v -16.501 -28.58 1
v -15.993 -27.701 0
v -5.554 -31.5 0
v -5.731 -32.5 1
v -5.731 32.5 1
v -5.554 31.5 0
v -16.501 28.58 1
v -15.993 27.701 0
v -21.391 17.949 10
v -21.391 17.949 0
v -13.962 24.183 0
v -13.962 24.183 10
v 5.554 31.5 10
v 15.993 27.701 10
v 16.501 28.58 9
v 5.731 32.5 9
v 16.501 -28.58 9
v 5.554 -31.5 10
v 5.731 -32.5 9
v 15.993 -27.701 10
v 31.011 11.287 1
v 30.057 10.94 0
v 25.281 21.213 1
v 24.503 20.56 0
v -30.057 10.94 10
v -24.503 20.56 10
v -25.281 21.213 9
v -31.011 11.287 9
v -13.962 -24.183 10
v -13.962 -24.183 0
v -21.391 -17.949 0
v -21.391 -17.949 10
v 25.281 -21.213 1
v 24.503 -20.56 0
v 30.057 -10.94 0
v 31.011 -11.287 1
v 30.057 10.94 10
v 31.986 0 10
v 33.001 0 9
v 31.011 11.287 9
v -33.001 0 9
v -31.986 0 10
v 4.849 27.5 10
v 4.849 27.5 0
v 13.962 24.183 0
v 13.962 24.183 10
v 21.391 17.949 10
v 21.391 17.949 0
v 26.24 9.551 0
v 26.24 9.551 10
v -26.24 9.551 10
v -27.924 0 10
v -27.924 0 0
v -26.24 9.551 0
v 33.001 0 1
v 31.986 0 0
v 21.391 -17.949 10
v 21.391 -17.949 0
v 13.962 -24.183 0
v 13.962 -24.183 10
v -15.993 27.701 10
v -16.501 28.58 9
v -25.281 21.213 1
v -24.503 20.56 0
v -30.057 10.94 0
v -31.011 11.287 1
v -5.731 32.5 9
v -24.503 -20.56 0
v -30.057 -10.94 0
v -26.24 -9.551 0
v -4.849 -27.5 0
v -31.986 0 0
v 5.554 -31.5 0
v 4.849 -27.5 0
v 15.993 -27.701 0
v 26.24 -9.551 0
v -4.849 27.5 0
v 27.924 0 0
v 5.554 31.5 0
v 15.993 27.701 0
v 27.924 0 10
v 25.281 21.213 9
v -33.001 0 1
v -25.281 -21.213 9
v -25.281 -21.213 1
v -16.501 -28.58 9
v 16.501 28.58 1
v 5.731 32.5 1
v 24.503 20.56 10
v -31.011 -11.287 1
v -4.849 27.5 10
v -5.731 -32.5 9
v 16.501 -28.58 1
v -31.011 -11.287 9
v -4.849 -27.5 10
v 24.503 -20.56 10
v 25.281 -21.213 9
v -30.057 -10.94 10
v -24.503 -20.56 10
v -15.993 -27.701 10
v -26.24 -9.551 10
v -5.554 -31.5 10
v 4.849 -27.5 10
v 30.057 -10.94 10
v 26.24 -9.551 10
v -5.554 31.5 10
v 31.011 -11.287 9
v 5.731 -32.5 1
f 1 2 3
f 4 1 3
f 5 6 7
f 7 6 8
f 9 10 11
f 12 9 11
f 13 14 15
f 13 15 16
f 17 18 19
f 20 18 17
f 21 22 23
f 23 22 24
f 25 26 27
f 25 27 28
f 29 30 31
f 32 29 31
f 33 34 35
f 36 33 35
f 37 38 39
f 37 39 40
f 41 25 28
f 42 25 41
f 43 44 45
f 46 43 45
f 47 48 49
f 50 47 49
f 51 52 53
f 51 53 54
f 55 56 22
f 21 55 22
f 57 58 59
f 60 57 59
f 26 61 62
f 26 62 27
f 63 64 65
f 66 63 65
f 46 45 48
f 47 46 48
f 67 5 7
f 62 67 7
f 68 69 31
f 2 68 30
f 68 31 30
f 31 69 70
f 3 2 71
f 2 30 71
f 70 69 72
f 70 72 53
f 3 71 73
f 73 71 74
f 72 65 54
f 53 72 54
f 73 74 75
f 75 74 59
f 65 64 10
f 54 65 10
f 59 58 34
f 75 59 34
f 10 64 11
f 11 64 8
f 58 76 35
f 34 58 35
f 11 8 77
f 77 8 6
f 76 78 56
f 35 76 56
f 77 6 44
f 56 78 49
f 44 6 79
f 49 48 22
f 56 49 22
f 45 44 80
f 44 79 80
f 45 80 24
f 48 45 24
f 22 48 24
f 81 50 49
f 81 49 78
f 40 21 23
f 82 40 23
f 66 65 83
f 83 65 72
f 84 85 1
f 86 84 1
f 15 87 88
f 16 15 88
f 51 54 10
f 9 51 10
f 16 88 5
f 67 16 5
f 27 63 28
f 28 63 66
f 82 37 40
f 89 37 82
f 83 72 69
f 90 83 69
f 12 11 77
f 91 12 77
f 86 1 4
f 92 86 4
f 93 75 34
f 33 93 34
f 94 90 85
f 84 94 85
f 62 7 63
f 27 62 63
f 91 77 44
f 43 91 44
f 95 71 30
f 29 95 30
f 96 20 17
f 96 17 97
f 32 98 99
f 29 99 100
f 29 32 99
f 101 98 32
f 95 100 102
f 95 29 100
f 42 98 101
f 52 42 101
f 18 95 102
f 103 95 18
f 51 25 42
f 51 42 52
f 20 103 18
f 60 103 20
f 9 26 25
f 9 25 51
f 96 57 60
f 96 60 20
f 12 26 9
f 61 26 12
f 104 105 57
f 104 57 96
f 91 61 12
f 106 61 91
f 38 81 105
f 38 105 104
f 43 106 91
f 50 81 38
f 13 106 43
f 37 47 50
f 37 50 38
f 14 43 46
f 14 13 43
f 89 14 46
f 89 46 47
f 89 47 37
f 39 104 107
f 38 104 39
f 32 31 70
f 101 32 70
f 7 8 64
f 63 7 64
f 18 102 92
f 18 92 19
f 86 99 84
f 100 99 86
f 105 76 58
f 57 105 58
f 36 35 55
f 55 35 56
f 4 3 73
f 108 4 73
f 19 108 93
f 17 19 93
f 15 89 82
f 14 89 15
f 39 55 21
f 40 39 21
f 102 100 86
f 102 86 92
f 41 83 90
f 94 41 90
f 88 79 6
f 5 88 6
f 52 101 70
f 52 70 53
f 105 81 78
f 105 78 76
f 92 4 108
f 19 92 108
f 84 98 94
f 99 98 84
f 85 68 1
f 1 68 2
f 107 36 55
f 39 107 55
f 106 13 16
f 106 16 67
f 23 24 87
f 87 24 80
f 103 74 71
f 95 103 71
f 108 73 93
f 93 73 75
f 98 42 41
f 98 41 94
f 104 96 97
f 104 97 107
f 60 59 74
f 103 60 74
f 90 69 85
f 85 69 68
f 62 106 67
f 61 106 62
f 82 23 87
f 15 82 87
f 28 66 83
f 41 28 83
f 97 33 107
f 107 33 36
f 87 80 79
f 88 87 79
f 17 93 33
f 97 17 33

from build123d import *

# Parameters (mm, degrees)
F1_DEPTH = 10
F2_SIZE  = 1


with BuildPart() as f1:
    # F0 (on Top) → F1 (new body)
    with BuildSketch(Plane.XY):
        Polygon((5.730627, 32.5), (-5.730627, 32.5), (-16.500682, 28.58002), (-25.280512, 21.212868), (-31.011139, 11.287132), (-33.001365, 0), (-31.011139, -11.287132), (-25.280512, -21.212868), (-16.500682, -28.58002), (-5.730627, -32.5), (5.730627, -32.5), (16.500682, -28.58002), (25.280512, -21.212868), (31.011139, -11.287132), (33.001365, 0), (31.011139, 11.287132), (25.280512, 21.212868), (16.500682, 28.58002), align=None)
        Polygon((-13.962116, 24.183094), (-4.848992, 27.5), (4.848992, 27.5), (13.962116, 24.183094), (21.391203, 17.94935), (26.240195, 9.55065), (27.924232, 0), (26.240195, -9.55065), (21.391203, -17.94935), (13.962116, -24.183094), (4.848992, -27.5), (-4.848992, -27.5), (-13.962116, -24.183094), (-21.391203, -17.94935), (-26.240195, -9.55065), (-27.924232, 0), (-26.240195, 9.55065), (-21.391203, 17.94935), align=None, mode=Mode.SUBTRACT)
    extrude(amount=F1_DEPTH)

    # F2
    f2_edges = [f1.edges().sort_by_distance(p)[0] for p in [
        (-20.890597, 24.896444, 10),
        (-11.115655, 30.54001, 10),
        (0, 32.5, 10),
        (11.115655, 30.54001, 10),
        (20.890597, 24.896444, 10),
        (28.145826, 16.25, 10),
        (32.006252, 5.643566, 10),
        (32.006252, -5.643566, 10),
        (28.145826, -16.25, 10),
        (20.890597, -24.896444, 10),
        (11.115655, -30.54001, 10),
        (0, -32.5, 10),
        (-11.115655, -30.54001, 10),
        (-20.890597, -24.896444, 10),
        (-28.145826, -16.25, 10),
        (-32.006252, -5.643566, 10),
        (-32.006252, 5.643566, 10),
        (-28.145826, 16.25, 10),
        (-32.006252, 5.643566, 0),
        (-28.145826, 16.25, 0),
        (-20.890597, 24.896444, 0),
        (-11.115655, 30.54001, 0),
        (-32.006252, -5.643566, 0),
        (-28.145826, -16.25, 0),
        (-20.890597, -24.896444, 0),
        (-11.115655, -30.54001, 0),
        (0, -32.5, 0),
        (11.115655, -30.54001, 0),
        (20.890597, -24.896444, 0),
        (28.145826, -16.25, 0),
        (32.006252, -5.643566, 0),
        (32.006252, 5.643566, 0),
        (28.145826, 16.25, 0),
        (20.890597, 24.896444, 0),
        (11.115655, 30.54001, 0),
        (0, 32.5, 0),
    ]]
    chamfer(f2_edges, length=F2_SIZE)


solid = f1.part
